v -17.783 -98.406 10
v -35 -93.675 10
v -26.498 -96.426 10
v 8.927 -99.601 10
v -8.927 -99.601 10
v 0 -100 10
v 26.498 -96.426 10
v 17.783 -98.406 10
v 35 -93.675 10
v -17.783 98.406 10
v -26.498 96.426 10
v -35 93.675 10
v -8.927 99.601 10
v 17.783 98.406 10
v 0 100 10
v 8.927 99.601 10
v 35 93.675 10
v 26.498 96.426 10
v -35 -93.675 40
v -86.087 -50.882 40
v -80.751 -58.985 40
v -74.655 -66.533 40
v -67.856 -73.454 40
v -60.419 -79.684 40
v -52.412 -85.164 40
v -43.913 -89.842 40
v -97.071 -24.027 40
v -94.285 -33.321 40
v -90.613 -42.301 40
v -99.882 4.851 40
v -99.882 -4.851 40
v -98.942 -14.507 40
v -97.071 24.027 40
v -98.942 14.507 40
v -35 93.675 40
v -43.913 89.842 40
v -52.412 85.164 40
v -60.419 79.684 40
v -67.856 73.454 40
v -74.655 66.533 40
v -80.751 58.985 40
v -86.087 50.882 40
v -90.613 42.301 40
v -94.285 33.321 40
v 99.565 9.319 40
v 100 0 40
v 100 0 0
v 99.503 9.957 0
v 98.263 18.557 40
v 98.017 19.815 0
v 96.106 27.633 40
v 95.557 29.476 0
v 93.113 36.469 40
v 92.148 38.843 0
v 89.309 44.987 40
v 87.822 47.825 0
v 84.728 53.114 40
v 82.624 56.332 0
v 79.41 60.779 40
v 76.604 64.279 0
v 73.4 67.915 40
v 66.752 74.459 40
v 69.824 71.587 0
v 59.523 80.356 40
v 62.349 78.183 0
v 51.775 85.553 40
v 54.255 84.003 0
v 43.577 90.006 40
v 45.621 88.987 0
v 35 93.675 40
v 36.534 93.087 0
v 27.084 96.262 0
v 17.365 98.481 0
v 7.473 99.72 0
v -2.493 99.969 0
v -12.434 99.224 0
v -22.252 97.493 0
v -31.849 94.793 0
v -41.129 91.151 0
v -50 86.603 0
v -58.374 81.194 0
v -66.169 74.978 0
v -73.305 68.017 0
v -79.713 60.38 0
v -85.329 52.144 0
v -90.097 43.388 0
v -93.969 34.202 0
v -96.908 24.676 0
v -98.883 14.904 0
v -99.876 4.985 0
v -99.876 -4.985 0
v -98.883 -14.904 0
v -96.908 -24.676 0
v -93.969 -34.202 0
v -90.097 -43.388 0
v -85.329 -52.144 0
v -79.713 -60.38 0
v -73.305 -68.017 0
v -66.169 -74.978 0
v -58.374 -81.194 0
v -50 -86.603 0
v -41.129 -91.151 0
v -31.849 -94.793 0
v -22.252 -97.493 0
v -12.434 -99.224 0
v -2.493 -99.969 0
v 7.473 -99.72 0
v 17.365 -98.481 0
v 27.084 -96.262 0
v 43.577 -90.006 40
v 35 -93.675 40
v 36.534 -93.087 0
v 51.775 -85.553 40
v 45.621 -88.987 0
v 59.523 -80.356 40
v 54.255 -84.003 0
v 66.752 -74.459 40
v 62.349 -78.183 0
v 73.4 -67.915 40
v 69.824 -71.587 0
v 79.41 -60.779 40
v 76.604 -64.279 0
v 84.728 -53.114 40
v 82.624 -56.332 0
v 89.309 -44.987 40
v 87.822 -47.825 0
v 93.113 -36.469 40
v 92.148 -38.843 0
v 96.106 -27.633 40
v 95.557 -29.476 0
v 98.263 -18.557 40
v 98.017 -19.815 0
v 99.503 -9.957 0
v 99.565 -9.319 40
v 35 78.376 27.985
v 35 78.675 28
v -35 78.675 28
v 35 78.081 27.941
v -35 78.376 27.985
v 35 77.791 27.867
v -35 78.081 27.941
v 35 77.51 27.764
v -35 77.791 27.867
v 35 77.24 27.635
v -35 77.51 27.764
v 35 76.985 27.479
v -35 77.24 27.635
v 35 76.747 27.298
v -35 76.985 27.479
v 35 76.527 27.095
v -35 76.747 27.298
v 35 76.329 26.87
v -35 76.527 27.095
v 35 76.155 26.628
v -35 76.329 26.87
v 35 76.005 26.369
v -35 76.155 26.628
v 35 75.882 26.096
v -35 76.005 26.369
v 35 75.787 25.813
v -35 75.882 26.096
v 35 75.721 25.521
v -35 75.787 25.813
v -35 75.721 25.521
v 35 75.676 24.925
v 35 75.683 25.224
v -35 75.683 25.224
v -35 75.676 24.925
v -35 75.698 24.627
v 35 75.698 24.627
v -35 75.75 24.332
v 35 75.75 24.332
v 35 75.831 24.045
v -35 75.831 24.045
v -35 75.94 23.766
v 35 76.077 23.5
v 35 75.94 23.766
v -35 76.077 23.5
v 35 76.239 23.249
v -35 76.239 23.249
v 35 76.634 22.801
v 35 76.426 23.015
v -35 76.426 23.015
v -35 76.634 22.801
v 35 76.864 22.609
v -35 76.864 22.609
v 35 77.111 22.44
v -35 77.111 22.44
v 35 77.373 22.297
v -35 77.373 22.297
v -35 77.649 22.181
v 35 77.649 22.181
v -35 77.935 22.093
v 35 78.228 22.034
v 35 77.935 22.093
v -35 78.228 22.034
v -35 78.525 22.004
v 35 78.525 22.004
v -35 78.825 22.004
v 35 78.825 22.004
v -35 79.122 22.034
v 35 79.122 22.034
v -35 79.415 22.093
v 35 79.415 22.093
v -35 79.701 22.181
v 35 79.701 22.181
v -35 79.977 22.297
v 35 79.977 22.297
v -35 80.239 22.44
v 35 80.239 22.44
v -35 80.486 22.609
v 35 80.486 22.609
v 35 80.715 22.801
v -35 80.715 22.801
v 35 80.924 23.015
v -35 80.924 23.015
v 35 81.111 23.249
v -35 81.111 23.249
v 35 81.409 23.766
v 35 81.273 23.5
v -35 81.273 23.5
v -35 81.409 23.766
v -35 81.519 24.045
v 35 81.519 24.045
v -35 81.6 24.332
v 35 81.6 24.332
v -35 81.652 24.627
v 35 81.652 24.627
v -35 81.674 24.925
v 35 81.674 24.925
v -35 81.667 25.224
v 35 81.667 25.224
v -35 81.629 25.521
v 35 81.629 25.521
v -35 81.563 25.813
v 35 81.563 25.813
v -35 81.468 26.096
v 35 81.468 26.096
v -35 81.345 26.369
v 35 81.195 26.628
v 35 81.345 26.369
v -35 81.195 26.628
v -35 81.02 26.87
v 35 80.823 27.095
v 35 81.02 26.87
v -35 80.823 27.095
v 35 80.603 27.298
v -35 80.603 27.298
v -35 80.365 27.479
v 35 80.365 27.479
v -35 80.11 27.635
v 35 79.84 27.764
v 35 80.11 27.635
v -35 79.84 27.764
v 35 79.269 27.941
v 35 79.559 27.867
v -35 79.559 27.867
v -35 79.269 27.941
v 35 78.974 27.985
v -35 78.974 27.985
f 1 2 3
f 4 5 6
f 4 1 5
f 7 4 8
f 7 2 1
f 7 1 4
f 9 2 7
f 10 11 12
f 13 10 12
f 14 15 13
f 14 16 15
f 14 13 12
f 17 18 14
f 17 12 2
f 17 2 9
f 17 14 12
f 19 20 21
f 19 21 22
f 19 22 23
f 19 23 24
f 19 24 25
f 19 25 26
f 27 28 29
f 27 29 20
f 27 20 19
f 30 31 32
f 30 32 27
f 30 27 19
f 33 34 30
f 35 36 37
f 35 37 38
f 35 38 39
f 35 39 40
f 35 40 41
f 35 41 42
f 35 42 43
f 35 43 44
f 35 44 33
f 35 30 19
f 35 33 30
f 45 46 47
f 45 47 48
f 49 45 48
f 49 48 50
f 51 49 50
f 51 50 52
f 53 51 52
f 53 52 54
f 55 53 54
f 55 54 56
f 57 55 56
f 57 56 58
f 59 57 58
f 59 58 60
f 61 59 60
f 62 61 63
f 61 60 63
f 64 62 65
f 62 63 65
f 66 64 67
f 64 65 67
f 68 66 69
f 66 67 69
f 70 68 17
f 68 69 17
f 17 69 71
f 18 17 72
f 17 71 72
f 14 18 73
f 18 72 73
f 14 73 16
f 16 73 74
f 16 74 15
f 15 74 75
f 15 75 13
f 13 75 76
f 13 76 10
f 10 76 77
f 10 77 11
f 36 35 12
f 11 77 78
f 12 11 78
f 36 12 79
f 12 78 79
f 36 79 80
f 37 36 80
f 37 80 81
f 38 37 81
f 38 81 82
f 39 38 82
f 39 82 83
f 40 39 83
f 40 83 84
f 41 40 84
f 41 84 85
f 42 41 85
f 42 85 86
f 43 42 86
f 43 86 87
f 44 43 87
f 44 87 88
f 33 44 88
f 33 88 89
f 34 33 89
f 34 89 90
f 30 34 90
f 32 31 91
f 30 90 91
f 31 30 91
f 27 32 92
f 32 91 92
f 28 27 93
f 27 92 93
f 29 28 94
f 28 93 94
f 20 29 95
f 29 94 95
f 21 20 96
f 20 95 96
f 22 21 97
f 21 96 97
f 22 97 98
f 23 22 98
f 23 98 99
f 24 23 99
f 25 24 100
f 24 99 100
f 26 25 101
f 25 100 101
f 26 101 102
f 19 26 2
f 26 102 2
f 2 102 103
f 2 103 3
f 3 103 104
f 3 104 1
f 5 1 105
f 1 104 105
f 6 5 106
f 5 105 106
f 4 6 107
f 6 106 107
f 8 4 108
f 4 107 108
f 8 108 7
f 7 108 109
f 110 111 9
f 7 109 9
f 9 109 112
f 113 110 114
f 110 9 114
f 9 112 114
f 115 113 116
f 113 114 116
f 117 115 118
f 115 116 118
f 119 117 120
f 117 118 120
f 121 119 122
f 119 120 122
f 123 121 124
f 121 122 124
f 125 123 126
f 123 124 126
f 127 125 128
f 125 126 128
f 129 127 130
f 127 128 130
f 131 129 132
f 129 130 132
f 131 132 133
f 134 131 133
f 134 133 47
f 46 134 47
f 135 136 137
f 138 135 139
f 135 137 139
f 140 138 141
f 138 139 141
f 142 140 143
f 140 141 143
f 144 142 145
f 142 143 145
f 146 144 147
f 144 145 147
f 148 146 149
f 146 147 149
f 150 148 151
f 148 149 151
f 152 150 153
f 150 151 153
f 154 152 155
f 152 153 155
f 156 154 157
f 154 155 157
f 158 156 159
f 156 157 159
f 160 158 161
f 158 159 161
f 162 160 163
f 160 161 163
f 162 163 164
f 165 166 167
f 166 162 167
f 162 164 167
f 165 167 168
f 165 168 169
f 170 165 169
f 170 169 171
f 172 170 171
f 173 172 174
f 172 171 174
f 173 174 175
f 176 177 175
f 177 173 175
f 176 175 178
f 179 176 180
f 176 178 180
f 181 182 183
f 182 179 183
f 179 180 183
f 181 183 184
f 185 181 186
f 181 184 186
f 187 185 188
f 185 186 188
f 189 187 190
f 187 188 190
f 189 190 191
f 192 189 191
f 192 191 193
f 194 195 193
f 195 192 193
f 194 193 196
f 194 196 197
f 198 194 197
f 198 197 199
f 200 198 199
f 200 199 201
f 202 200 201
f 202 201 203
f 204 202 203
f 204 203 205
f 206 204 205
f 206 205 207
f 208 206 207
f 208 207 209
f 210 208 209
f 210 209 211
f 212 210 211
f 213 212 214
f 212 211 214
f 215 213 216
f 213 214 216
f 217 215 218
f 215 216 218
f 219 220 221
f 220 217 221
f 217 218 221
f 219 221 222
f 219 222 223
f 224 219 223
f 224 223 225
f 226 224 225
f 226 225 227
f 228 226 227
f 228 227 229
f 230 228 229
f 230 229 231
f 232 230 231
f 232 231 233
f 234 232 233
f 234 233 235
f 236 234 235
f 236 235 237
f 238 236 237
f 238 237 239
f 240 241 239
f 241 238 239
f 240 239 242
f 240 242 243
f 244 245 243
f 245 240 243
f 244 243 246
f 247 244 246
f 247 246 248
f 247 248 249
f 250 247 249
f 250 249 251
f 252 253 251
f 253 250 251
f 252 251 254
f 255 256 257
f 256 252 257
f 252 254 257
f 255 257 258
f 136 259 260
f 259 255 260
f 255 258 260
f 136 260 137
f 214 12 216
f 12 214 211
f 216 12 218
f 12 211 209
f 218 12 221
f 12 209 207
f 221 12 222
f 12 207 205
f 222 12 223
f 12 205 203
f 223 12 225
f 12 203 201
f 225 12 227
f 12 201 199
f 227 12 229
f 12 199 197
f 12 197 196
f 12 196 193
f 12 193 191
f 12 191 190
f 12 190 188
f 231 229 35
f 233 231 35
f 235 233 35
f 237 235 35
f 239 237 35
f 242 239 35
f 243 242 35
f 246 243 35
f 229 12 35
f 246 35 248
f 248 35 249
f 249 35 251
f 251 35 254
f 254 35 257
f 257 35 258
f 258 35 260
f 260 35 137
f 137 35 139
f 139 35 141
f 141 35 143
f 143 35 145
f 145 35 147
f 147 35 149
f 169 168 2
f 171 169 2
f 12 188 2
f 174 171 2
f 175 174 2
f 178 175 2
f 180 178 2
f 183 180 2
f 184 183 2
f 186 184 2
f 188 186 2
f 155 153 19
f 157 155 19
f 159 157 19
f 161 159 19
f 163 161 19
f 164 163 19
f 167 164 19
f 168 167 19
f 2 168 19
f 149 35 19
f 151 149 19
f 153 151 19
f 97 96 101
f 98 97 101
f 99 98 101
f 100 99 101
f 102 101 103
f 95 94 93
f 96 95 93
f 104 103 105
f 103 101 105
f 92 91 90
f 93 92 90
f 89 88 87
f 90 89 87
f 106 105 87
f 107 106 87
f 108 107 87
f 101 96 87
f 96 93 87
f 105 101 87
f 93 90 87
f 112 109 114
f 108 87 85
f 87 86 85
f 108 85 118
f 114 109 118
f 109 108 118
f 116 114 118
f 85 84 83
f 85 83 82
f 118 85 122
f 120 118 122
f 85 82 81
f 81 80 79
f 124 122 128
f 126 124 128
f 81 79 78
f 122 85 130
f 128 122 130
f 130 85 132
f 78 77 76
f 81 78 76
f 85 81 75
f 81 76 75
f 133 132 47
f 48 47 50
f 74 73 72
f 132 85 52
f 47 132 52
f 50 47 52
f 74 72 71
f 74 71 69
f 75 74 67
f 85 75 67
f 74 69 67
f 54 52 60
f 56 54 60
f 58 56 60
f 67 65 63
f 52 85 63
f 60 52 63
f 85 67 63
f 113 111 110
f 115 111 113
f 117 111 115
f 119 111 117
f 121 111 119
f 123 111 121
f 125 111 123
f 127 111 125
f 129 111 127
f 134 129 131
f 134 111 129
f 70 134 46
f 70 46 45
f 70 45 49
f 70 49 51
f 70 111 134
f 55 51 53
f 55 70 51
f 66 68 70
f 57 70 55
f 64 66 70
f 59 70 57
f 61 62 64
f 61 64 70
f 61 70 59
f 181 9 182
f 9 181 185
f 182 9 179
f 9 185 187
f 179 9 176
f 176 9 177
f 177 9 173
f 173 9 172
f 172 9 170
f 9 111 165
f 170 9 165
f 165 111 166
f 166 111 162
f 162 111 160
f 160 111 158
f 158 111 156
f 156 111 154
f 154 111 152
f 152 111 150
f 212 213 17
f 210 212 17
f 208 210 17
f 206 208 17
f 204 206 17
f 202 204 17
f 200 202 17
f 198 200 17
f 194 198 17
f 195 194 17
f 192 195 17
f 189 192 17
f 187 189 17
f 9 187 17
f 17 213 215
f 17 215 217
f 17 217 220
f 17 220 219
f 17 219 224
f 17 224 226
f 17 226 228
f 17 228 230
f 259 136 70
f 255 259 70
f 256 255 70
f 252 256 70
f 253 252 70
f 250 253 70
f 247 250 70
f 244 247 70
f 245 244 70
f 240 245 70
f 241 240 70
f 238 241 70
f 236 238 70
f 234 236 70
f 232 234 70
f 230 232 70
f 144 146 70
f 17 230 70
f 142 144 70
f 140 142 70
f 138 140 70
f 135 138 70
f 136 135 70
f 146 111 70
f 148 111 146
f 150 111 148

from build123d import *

# Parameters (mm, degrees)
SKETCH_2_R          = 100
EXTRUDE_1_DEPTH     = 40
CUT_EXTRUDE_1_DEPTH = 30
SKETCH_4_R          = 3
EXTRUDE_2_DEPTH     = 74


with BuildPart() as part:
    # 草图2 → 凸台-拉伸1 (new body)
    with BuildSketch(Plane.XY):
        Circle(SKETCH_2_R)
    extrude(amount=EXTRUDE_1_DEPTH)

    # 草图3 → 切除-拉伸1 (cut)
    with BuildSketch(Plane.XY.offset(40)):
        Polygon((0, -100), (35, -100), (35, 100), (-35, 100), (-35, -100), align=None)
    extrude(amount=-CUT_EXTRUDE_1_DEPTH, mode=Mode.SUBTRACT)

    # 草图4 → 凸台-拉伸2 (add)
    with BuildSketch(Plane(origin=(-35, 0, 0), x_dir=(0, 0, -1), z_dir=(1, 0, 0))):
        with Locations(Location((-25, 78.674969976, 0), (0, 0, 180))):
            Circle(SKETCH_4_R)
    extrude(amount=EXTRUDE_2_DEPTH)


solid = part.part
